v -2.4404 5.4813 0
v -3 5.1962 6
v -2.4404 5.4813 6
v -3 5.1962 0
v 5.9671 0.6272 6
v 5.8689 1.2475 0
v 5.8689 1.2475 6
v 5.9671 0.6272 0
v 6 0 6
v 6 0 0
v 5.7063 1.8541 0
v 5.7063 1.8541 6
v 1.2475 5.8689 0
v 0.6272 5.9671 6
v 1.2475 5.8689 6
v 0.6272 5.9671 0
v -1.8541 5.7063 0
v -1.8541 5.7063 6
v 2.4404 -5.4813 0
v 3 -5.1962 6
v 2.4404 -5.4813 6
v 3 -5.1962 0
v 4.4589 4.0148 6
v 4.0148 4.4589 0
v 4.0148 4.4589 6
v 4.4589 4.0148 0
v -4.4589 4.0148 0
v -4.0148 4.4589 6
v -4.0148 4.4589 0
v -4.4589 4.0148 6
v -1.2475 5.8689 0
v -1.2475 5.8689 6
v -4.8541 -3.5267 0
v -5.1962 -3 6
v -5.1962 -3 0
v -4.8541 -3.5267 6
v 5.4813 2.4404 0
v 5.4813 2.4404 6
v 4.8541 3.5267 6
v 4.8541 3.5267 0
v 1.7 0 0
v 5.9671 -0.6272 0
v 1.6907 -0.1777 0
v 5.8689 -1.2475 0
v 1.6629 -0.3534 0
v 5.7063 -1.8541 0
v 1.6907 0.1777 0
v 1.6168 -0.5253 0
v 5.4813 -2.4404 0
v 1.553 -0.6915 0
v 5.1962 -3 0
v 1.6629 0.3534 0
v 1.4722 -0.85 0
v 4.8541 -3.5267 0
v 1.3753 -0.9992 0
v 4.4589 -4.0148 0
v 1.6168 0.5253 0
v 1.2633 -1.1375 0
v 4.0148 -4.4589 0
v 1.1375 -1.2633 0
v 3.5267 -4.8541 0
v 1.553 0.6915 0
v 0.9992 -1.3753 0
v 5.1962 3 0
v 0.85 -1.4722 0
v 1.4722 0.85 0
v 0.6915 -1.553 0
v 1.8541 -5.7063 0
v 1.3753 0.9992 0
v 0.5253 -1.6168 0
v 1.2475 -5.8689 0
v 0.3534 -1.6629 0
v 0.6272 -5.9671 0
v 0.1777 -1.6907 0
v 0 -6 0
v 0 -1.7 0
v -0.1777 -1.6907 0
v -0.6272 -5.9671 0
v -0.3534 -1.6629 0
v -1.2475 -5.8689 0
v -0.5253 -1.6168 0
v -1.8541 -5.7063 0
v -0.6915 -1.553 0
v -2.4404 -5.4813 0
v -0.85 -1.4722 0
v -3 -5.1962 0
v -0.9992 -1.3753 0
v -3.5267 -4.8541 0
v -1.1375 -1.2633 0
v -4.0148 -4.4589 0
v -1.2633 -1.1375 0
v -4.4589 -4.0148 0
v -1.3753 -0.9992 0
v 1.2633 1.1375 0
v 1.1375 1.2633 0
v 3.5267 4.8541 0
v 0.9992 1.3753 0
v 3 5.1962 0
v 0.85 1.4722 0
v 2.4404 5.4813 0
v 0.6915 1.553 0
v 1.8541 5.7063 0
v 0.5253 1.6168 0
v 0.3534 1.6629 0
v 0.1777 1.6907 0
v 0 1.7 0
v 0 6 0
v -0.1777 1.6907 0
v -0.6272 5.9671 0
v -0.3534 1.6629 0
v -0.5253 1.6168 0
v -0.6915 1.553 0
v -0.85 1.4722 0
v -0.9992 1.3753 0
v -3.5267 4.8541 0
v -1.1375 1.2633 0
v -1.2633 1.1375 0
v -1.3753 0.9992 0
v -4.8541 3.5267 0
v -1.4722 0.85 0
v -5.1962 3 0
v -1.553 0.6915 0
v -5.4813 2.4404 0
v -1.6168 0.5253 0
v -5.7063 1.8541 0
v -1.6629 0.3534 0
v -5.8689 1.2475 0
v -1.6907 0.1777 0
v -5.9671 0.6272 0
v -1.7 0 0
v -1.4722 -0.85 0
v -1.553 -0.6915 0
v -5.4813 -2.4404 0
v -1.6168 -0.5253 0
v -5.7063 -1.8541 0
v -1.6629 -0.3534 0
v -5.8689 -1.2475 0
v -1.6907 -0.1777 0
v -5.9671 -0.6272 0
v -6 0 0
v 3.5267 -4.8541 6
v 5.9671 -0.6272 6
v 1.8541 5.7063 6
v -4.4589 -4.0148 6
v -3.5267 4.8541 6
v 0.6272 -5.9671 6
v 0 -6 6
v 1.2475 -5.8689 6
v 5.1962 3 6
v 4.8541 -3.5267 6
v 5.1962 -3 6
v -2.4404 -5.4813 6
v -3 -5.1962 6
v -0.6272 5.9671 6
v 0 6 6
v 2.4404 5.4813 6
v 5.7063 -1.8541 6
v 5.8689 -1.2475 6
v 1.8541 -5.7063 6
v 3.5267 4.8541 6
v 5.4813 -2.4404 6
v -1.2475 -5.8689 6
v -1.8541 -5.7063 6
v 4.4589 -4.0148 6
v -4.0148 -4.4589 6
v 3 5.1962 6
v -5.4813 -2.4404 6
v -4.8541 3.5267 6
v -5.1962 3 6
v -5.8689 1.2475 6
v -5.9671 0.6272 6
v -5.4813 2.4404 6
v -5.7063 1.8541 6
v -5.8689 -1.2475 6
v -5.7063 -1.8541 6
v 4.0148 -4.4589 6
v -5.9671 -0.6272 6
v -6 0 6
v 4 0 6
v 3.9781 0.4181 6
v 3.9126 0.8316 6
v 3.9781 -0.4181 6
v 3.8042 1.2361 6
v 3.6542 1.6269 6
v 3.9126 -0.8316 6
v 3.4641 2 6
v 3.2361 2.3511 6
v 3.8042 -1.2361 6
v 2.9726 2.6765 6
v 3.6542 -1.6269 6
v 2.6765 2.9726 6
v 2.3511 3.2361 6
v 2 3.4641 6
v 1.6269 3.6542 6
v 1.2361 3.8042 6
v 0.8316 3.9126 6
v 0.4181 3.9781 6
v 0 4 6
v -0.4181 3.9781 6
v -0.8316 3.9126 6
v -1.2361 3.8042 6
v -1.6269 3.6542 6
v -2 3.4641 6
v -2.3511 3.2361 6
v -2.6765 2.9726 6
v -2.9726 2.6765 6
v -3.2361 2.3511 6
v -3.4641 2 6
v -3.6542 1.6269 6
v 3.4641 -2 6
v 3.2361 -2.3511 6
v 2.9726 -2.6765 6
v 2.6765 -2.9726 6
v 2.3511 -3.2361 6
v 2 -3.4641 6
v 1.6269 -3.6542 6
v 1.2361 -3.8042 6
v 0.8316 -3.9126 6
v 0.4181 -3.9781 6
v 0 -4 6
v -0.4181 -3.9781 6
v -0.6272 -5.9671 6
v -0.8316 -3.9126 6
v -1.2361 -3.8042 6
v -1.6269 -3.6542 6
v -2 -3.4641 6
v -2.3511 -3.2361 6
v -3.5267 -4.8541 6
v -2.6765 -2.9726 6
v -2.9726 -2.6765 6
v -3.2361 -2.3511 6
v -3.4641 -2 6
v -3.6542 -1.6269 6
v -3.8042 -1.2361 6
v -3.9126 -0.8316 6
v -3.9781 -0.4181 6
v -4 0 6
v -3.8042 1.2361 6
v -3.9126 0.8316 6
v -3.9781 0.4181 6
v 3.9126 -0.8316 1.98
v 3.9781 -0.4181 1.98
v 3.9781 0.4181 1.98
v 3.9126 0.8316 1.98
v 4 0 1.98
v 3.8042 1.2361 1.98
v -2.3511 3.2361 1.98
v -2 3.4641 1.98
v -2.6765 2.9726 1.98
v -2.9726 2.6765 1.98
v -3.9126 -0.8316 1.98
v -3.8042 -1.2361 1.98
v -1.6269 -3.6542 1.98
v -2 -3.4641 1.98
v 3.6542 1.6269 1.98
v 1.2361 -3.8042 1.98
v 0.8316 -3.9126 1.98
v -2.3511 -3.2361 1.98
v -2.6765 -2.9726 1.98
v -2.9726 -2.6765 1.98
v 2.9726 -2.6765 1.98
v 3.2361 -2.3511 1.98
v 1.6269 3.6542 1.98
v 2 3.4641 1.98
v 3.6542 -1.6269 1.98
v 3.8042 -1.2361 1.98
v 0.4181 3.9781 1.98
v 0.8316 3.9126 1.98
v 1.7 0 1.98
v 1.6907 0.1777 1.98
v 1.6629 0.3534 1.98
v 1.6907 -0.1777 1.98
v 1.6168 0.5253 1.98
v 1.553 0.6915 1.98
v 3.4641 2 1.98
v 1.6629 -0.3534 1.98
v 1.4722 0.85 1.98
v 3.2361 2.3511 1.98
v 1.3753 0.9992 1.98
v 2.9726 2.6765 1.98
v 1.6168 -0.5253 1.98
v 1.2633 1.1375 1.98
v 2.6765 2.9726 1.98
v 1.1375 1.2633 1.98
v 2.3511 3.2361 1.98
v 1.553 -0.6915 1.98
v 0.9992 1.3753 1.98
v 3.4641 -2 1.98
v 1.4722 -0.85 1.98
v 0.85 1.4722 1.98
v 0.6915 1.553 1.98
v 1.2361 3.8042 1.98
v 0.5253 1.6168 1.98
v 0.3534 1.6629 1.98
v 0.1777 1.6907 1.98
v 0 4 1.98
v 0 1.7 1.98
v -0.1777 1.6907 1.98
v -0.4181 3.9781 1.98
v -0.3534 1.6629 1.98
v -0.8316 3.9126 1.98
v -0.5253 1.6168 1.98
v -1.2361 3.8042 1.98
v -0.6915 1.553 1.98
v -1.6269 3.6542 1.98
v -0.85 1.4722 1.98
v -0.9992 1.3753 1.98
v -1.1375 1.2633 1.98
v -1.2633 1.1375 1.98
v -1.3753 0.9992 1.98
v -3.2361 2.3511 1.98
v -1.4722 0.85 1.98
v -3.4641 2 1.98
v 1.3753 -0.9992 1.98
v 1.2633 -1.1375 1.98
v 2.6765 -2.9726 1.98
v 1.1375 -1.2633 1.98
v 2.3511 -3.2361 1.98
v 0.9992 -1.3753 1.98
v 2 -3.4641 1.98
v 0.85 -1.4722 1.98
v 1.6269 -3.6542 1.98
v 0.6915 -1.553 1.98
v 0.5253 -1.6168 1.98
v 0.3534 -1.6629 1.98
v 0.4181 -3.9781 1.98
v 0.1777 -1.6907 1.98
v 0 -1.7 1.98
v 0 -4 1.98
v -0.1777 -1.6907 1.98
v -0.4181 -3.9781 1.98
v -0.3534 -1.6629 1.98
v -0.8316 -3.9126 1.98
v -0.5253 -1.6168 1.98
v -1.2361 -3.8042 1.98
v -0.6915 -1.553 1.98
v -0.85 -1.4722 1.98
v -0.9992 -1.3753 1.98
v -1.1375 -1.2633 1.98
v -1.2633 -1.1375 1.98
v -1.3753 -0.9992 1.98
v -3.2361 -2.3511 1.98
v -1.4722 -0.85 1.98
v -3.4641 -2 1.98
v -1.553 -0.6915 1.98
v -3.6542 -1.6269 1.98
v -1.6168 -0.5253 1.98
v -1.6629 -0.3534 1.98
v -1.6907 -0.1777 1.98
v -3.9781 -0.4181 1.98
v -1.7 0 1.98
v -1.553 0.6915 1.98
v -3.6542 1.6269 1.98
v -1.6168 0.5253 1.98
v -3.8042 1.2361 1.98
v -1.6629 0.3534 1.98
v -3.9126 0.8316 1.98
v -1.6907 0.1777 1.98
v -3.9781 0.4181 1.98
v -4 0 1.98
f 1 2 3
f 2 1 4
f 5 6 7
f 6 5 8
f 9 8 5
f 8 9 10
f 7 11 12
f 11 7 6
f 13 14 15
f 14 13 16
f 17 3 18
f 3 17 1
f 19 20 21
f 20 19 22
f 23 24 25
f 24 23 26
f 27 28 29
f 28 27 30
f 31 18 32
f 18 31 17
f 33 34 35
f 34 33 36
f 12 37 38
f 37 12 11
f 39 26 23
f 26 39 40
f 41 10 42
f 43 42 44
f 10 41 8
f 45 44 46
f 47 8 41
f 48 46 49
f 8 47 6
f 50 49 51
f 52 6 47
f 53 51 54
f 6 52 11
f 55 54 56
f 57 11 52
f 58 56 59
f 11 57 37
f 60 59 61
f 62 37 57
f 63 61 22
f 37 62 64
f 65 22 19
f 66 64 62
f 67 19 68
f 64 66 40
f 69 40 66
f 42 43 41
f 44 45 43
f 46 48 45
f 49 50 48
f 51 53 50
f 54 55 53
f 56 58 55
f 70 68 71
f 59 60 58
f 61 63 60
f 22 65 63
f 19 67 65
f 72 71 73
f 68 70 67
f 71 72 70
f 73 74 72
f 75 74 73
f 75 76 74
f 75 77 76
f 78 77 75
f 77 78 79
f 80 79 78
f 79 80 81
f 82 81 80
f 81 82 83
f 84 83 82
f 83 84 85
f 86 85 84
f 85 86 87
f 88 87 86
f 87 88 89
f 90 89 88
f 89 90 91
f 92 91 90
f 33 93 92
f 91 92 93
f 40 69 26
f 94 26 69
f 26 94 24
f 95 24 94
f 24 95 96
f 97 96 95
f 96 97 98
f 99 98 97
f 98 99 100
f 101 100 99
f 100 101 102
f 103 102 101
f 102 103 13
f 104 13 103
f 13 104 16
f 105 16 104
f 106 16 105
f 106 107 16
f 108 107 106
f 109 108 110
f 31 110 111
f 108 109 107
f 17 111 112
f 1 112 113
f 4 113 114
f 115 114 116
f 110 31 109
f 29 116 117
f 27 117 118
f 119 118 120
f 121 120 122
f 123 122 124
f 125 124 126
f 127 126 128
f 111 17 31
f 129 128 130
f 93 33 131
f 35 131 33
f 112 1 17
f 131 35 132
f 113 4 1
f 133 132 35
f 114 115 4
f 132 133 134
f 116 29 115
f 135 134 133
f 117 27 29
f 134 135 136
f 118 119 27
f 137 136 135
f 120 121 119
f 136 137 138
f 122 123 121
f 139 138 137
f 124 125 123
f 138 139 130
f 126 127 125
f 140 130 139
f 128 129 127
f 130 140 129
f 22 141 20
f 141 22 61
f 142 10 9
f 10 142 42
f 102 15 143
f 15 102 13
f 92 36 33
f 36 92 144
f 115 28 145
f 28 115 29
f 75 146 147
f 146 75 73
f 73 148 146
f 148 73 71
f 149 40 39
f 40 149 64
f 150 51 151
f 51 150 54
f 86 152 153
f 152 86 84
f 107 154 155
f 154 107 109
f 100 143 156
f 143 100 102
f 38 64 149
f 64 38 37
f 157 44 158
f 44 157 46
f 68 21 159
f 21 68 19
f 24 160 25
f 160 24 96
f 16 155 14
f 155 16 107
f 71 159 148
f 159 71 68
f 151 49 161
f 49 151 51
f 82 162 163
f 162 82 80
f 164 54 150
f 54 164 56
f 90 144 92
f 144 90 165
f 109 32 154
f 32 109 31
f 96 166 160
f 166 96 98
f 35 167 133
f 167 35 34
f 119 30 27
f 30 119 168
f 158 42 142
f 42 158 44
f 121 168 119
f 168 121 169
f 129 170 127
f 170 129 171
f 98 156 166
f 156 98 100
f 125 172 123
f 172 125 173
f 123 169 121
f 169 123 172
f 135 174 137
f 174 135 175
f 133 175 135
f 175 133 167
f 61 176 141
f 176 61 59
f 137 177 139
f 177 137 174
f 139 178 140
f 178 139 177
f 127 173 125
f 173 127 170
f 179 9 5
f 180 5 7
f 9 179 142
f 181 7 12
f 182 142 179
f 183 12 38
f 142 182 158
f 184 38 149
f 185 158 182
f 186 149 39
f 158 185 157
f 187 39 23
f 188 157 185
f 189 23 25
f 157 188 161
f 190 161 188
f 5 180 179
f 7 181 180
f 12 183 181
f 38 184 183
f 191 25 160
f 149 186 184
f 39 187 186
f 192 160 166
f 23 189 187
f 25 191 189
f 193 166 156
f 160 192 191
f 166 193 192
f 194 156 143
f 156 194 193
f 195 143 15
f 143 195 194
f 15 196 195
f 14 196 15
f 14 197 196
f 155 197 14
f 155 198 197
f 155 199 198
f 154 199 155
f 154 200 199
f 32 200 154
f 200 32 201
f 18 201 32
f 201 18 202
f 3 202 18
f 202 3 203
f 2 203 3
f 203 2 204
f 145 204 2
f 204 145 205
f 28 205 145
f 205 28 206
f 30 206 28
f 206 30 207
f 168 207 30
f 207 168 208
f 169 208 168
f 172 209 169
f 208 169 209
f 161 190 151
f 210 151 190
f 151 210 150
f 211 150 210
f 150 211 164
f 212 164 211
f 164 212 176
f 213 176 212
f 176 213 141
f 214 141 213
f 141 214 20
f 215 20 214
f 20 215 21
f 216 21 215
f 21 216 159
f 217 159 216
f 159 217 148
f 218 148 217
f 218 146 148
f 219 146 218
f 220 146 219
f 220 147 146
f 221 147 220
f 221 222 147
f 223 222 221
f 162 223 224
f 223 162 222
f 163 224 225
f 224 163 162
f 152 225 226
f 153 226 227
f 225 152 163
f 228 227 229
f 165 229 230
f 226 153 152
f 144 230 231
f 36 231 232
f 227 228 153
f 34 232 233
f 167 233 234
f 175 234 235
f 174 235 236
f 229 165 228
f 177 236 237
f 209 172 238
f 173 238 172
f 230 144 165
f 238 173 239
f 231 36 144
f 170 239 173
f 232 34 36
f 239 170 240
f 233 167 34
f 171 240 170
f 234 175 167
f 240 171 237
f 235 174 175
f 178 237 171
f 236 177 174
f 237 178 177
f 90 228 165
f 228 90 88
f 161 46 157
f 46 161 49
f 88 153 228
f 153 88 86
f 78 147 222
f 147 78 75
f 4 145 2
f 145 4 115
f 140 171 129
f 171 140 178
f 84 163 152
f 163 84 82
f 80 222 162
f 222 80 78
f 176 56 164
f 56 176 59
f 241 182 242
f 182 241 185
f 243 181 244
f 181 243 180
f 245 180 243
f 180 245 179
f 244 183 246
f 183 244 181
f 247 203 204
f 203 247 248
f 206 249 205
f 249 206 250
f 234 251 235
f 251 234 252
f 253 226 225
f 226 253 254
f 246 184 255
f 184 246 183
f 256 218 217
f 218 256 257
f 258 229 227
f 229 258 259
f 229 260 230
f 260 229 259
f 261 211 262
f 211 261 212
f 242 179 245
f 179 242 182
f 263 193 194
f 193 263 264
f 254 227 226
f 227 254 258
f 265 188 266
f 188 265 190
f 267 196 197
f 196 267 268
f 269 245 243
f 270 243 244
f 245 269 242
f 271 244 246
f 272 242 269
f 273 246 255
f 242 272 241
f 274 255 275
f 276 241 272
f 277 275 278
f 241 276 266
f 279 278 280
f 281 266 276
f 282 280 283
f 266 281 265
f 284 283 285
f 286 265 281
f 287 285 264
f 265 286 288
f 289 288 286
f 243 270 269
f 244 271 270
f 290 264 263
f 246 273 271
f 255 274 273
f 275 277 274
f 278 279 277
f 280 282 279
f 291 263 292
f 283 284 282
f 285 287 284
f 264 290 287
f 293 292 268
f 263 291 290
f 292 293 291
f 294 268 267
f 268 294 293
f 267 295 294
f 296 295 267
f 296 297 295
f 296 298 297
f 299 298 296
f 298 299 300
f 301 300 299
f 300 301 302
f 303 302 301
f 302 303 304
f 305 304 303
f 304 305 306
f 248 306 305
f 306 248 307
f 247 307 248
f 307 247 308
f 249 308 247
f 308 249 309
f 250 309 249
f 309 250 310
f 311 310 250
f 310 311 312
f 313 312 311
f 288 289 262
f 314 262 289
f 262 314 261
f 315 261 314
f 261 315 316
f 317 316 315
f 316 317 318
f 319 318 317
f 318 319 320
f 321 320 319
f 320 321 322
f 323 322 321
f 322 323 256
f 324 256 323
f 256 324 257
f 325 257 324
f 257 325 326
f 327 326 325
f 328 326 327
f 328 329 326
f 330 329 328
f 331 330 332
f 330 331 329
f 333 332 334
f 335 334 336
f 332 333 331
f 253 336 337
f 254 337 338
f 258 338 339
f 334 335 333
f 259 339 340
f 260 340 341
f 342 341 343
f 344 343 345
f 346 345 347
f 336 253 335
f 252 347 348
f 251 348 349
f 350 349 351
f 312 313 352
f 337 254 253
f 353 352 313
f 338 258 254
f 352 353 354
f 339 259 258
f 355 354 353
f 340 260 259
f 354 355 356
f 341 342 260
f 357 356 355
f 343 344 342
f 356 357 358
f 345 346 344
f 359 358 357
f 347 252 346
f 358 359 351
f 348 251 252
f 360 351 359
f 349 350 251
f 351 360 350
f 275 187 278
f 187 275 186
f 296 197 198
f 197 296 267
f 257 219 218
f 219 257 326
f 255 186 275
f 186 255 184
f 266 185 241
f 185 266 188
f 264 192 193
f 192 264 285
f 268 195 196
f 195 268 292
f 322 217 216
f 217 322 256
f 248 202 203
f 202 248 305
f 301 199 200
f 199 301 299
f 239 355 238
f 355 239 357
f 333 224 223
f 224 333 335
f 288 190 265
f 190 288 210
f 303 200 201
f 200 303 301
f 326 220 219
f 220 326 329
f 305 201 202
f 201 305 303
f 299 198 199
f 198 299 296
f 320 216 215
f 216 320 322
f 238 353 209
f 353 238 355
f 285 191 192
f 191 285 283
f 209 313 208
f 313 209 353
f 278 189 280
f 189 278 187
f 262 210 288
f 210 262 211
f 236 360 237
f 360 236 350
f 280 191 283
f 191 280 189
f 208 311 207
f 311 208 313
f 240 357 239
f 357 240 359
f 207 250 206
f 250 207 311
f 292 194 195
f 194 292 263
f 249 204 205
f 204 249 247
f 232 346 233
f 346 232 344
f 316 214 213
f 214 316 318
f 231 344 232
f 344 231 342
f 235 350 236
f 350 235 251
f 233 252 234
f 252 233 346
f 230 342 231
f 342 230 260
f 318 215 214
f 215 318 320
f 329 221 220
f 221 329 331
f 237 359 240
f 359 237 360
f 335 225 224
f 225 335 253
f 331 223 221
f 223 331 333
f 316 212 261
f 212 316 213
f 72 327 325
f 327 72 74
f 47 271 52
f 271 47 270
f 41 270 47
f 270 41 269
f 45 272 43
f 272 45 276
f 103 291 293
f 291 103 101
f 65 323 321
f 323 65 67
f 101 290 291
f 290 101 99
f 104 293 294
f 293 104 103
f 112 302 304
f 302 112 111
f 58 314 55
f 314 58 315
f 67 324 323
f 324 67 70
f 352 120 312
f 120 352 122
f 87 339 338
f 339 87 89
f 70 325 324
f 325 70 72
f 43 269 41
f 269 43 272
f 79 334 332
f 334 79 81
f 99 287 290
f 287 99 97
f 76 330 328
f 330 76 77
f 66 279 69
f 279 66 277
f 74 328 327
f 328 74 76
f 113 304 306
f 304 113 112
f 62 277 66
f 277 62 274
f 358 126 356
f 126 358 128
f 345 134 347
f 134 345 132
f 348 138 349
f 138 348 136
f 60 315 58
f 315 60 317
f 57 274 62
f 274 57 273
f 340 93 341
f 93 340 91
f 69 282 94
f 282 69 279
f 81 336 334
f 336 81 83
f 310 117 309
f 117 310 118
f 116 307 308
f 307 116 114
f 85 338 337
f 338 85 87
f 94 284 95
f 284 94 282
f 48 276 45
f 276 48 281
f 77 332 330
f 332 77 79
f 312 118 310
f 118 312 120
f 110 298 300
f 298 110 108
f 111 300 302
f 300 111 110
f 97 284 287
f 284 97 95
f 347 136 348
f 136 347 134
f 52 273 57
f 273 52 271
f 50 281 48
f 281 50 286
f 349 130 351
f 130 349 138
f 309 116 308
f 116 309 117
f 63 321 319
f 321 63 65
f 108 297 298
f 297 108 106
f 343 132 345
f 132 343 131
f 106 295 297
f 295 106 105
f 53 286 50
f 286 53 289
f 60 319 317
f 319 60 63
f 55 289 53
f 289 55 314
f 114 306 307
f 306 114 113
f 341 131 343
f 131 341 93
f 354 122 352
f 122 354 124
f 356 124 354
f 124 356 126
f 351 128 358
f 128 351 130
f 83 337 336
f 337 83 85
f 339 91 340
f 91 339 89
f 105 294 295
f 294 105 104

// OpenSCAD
// Recessed magnet cup.
$fn = 60;
eps = 0.02;
magnet_d = 8;
wall = 2;
outer_d = magnet_d+2*wall;
height = wall+4;
difference() {
    cylinder(d=outer_d,h=height);
    translate([0,0,wall-eps]) cylinder(d=magnet_d,h=height-wall+2*eps);
    translate([0,0,-eps]) cylinder(d=3.4,h=wall+2*eps);
}
